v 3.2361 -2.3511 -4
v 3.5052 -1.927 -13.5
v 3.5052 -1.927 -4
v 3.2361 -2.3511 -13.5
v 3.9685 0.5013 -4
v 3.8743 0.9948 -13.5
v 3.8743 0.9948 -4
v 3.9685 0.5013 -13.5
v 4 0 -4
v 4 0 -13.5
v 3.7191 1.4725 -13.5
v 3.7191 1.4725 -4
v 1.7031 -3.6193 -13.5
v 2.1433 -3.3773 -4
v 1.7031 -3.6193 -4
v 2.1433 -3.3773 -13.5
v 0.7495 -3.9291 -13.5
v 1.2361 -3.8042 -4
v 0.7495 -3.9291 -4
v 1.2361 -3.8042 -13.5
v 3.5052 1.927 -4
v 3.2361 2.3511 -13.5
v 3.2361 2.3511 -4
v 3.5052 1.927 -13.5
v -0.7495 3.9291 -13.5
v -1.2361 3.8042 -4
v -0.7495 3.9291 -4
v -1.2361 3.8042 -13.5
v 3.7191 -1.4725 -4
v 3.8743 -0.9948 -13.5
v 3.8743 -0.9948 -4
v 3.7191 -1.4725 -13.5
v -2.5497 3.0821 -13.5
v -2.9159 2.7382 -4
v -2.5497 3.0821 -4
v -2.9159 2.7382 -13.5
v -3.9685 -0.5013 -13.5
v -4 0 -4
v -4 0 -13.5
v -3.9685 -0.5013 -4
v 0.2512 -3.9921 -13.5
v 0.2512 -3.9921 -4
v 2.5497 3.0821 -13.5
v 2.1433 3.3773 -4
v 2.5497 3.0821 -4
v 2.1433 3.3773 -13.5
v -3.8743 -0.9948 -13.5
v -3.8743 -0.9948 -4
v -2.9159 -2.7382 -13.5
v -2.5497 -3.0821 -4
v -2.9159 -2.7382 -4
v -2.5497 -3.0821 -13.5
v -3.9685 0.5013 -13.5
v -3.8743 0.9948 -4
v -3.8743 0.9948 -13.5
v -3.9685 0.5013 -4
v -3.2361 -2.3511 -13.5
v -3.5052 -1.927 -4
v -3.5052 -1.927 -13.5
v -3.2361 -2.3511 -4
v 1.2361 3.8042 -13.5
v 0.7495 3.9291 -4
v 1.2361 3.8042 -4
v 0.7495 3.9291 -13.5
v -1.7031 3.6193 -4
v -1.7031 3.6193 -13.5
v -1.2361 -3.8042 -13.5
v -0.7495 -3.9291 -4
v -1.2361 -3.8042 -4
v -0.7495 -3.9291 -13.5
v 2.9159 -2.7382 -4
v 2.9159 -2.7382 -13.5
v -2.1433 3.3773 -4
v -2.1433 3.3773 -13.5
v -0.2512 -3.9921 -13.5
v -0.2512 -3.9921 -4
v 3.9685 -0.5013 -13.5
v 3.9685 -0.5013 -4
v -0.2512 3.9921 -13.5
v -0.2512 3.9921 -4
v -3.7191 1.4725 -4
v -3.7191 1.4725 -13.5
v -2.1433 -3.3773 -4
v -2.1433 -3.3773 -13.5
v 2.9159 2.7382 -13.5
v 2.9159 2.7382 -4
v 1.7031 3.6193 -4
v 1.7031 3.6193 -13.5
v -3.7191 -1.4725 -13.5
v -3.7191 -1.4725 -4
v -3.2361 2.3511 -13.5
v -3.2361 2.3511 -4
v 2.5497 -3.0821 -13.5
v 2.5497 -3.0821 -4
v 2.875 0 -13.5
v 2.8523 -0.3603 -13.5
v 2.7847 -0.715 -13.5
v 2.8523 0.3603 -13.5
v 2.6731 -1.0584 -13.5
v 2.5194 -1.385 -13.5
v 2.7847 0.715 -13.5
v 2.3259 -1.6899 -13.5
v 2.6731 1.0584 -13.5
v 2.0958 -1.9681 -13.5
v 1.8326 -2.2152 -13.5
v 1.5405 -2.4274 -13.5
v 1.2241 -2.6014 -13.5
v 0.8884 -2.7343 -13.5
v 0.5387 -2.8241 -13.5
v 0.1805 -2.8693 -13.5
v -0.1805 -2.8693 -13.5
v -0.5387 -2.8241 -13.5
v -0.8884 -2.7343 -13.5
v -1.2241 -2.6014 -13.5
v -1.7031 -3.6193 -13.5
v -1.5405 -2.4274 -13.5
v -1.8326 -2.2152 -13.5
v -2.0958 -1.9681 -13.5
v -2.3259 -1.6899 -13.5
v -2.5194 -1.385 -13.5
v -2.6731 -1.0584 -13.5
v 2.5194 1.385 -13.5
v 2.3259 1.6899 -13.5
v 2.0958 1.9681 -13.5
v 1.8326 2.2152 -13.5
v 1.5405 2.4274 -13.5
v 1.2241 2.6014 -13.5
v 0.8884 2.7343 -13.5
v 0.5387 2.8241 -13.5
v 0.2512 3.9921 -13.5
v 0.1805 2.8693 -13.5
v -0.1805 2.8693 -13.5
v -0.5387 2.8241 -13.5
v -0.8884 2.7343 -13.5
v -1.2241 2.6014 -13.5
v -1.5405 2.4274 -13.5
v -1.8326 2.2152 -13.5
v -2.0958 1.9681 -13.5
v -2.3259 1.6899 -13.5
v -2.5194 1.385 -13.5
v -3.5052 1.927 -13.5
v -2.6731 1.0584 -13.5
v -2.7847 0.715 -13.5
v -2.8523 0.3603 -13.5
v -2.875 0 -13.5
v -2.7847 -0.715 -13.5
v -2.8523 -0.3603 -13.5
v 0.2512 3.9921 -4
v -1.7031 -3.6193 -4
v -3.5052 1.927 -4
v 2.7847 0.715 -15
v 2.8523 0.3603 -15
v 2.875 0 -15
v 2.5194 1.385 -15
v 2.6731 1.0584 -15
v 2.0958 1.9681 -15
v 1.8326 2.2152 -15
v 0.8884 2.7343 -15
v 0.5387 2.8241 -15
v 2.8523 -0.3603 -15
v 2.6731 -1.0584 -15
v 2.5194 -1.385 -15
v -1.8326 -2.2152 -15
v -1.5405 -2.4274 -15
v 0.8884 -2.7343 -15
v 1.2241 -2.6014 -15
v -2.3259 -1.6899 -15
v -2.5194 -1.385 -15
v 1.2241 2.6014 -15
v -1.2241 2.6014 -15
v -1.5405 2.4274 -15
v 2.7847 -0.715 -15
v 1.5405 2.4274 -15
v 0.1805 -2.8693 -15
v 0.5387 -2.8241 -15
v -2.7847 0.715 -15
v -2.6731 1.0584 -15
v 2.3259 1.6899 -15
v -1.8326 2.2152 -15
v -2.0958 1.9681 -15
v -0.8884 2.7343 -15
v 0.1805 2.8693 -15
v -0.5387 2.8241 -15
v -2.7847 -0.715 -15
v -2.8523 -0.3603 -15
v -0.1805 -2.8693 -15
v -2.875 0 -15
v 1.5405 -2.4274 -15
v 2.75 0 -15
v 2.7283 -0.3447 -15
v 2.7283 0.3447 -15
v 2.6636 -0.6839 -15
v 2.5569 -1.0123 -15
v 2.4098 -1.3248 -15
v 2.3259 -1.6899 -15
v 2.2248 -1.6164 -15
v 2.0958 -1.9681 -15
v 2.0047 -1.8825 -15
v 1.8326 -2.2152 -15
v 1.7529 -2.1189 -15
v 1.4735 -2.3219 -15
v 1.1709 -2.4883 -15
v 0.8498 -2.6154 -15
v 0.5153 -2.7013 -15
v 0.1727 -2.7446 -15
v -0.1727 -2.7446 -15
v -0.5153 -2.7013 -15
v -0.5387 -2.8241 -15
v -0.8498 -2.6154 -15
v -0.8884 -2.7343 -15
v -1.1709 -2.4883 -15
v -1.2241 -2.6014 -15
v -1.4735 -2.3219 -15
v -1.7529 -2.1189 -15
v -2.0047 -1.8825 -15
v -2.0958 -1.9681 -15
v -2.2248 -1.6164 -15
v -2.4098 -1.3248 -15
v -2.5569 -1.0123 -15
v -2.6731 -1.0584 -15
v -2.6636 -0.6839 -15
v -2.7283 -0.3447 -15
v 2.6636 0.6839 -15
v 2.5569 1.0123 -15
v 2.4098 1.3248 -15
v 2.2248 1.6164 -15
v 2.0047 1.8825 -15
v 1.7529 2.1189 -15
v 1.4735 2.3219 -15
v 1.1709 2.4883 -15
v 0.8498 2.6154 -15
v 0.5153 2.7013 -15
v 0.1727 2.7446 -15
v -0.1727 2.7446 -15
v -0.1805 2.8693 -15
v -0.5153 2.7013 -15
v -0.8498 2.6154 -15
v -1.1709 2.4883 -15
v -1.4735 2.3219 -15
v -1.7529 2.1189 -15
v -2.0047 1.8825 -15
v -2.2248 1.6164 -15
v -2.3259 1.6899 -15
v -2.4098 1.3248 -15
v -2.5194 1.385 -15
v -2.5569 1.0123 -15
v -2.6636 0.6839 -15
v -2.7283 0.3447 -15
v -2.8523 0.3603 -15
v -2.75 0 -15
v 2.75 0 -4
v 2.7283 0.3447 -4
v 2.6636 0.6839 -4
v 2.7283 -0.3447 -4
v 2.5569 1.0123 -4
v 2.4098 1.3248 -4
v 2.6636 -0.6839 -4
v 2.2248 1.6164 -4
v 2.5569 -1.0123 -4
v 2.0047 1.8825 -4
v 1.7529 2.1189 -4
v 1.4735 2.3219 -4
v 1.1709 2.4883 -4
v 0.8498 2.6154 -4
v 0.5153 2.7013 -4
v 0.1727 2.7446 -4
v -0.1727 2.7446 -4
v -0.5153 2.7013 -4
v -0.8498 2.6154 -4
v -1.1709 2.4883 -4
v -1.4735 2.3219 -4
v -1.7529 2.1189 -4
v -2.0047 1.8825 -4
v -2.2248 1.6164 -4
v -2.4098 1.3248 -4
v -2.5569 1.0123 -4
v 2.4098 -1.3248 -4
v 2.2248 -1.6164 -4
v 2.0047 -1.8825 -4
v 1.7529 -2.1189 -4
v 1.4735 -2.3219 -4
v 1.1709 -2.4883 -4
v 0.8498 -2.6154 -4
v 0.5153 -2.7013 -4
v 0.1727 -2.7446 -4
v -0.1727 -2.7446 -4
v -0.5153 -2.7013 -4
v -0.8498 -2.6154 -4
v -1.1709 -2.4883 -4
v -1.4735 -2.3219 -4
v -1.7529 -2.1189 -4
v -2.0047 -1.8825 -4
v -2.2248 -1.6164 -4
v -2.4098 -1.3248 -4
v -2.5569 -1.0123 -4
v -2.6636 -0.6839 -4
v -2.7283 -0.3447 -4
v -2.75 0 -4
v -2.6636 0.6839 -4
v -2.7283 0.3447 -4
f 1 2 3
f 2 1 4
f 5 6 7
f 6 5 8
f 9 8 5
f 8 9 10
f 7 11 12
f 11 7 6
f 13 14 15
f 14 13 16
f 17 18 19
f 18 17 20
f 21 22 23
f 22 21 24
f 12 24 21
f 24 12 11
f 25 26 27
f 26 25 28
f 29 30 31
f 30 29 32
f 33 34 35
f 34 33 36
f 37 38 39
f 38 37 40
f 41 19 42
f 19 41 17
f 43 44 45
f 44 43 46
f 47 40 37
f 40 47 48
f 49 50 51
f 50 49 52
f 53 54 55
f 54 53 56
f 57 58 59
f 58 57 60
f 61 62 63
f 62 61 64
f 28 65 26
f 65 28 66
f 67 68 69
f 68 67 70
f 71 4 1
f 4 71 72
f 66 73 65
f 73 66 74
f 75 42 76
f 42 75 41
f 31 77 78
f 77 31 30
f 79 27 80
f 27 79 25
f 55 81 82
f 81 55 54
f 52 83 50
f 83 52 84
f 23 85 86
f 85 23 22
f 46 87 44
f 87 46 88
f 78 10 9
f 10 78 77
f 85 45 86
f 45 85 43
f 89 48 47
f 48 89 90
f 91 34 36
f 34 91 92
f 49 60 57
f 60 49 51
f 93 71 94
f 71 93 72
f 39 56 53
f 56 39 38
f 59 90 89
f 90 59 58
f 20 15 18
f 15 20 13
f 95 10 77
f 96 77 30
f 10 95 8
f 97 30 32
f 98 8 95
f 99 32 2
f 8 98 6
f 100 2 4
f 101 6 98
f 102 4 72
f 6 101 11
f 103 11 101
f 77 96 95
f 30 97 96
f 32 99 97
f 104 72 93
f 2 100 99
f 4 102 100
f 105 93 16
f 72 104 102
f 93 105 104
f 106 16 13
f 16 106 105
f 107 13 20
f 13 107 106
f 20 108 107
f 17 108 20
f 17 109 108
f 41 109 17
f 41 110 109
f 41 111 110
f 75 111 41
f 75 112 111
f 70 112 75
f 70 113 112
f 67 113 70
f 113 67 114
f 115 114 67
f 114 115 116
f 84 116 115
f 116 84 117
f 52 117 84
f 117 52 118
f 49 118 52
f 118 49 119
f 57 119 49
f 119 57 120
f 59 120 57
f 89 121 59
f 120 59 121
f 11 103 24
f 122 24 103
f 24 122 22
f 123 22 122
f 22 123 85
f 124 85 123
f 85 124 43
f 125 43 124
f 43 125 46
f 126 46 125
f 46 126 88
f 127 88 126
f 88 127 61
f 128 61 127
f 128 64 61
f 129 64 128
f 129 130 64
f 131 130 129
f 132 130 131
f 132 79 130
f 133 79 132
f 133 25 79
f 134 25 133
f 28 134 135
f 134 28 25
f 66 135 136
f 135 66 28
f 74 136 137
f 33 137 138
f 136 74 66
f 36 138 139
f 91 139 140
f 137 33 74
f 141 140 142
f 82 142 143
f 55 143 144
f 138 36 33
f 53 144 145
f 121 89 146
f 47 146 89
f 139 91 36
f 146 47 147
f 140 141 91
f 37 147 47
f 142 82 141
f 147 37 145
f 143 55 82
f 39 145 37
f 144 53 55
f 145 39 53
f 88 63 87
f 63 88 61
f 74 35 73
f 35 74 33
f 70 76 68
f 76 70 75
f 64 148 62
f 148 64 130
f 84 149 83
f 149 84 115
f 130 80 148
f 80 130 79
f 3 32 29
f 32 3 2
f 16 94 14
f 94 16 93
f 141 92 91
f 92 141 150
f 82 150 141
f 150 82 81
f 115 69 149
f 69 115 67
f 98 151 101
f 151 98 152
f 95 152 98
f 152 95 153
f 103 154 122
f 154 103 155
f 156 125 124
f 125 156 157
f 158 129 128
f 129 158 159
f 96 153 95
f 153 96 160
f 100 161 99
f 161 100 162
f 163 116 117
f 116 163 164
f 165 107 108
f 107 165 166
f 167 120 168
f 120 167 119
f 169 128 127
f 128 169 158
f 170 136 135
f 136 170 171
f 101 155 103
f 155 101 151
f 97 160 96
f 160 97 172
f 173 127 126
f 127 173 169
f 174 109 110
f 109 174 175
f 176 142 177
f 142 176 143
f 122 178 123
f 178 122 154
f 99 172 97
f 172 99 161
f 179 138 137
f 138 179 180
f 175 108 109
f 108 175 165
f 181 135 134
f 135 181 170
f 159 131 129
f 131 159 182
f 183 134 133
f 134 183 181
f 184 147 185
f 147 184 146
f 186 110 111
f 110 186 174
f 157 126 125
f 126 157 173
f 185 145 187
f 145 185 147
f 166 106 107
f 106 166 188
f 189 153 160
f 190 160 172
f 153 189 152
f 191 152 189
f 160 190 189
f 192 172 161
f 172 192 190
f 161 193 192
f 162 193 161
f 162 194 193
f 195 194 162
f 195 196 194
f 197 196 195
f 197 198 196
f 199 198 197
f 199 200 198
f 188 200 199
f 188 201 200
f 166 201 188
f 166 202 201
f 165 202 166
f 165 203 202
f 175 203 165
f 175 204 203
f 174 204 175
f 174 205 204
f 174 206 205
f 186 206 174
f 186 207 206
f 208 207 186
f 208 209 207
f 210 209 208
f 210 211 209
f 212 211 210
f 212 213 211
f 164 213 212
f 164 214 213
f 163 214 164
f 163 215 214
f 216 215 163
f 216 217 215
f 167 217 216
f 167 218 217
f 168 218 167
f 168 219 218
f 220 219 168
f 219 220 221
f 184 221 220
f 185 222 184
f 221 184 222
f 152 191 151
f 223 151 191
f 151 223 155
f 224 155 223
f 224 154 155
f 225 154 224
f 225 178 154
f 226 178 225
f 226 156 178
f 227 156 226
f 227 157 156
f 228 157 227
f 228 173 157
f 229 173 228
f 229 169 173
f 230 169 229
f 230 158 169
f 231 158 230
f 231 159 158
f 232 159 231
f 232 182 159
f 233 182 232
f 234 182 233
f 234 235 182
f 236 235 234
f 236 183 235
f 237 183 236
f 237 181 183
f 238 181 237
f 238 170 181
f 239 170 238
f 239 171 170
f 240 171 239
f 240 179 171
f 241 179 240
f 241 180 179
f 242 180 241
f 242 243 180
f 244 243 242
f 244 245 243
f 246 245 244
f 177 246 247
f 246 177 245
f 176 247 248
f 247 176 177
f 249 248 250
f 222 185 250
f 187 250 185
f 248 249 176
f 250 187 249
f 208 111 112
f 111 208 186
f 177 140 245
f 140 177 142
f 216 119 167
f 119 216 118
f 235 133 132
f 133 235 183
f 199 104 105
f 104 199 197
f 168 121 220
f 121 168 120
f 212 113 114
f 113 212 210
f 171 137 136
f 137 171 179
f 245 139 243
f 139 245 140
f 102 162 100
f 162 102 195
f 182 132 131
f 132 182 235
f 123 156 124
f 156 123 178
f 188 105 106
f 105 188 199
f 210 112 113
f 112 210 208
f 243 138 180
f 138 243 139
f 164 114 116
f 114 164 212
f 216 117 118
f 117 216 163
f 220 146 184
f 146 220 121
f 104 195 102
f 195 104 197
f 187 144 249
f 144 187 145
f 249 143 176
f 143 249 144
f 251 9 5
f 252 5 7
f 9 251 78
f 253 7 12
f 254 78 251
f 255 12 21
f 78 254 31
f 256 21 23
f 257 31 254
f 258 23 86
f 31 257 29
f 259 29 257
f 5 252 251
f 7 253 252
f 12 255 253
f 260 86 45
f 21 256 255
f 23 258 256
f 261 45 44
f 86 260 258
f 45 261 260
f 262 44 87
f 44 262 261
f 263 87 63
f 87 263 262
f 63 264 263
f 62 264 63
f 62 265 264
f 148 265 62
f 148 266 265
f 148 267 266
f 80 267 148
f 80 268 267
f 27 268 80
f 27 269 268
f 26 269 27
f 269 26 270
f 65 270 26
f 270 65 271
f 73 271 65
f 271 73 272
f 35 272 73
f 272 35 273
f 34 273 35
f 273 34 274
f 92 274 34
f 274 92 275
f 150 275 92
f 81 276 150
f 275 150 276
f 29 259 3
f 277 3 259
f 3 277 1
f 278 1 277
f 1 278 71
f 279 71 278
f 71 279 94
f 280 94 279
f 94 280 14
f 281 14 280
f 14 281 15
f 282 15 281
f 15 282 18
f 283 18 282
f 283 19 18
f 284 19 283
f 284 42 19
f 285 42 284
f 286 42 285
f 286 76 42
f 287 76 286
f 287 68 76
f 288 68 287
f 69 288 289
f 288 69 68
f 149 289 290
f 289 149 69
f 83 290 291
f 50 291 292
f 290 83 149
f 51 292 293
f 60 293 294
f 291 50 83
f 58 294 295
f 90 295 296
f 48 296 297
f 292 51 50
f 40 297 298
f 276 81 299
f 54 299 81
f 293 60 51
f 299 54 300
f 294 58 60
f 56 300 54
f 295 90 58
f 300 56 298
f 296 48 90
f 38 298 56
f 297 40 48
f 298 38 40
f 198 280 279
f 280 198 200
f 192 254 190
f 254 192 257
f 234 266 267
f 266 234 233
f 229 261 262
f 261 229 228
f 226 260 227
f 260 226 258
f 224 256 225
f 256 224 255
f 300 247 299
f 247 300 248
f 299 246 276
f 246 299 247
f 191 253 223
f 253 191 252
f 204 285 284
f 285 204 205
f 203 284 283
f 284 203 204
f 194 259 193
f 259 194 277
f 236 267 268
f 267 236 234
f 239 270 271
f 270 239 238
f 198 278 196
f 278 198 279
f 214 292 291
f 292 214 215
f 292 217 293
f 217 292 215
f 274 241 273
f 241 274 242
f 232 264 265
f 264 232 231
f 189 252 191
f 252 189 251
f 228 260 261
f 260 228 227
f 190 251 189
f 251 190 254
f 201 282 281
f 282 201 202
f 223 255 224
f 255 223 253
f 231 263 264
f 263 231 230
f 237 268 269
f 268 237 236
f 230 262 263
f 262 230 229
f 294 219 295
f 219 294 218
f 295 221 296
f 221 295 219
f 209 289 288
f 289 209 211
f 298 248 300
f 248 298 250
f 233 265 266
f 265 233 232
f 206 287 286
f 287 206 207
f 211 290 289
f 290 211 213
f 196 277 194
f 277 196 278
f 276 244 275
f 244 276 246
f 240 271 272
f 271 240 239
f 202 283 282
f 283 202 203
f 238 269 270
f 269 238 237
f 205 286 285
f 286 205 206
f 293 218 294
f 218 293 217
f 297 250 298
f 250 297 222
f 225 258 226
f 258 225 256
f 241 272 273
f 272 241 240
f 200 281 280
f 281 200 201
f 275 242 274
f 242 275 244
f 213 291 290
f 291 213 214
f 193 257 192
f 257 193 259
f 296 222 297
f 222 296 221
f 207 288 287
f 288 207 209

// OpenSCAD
$fn = 50;

difference() {
	union() {
		translate(v = [0, 0, -13.5]) {
			cylinder(h = 13.5, r = 4.0);
		}
		#translate(v = [0, 0, -15.0]) {
			cylinder(h = 15, r = 2.875);
		}
	}
	union() {
		translate(v = [0, 0, 0]) {
			rotate(a = [0, 0, 0]) {
				difference() {
					union() {
						translate(v = [0, 0, -4]) {
							linear_extrude(height = 4) {
								polygon(points = [[4.8468, 0.0], [2.4234000000000004, 4.197451927062417], [-2.423399999999999, 4.197451927062417], [-4.8468, 5.935618106107392e-16], [-2.423400000000002, -4.197451927062416], [2.423399999999997, -4.197451927062419]]);
							}
						}
					}
					union();
				}
			}
		}
		#translate(v = [0, 0, -100.0]) {
			cylinder(h = 200, r = 2.75);
		}
	}
}
